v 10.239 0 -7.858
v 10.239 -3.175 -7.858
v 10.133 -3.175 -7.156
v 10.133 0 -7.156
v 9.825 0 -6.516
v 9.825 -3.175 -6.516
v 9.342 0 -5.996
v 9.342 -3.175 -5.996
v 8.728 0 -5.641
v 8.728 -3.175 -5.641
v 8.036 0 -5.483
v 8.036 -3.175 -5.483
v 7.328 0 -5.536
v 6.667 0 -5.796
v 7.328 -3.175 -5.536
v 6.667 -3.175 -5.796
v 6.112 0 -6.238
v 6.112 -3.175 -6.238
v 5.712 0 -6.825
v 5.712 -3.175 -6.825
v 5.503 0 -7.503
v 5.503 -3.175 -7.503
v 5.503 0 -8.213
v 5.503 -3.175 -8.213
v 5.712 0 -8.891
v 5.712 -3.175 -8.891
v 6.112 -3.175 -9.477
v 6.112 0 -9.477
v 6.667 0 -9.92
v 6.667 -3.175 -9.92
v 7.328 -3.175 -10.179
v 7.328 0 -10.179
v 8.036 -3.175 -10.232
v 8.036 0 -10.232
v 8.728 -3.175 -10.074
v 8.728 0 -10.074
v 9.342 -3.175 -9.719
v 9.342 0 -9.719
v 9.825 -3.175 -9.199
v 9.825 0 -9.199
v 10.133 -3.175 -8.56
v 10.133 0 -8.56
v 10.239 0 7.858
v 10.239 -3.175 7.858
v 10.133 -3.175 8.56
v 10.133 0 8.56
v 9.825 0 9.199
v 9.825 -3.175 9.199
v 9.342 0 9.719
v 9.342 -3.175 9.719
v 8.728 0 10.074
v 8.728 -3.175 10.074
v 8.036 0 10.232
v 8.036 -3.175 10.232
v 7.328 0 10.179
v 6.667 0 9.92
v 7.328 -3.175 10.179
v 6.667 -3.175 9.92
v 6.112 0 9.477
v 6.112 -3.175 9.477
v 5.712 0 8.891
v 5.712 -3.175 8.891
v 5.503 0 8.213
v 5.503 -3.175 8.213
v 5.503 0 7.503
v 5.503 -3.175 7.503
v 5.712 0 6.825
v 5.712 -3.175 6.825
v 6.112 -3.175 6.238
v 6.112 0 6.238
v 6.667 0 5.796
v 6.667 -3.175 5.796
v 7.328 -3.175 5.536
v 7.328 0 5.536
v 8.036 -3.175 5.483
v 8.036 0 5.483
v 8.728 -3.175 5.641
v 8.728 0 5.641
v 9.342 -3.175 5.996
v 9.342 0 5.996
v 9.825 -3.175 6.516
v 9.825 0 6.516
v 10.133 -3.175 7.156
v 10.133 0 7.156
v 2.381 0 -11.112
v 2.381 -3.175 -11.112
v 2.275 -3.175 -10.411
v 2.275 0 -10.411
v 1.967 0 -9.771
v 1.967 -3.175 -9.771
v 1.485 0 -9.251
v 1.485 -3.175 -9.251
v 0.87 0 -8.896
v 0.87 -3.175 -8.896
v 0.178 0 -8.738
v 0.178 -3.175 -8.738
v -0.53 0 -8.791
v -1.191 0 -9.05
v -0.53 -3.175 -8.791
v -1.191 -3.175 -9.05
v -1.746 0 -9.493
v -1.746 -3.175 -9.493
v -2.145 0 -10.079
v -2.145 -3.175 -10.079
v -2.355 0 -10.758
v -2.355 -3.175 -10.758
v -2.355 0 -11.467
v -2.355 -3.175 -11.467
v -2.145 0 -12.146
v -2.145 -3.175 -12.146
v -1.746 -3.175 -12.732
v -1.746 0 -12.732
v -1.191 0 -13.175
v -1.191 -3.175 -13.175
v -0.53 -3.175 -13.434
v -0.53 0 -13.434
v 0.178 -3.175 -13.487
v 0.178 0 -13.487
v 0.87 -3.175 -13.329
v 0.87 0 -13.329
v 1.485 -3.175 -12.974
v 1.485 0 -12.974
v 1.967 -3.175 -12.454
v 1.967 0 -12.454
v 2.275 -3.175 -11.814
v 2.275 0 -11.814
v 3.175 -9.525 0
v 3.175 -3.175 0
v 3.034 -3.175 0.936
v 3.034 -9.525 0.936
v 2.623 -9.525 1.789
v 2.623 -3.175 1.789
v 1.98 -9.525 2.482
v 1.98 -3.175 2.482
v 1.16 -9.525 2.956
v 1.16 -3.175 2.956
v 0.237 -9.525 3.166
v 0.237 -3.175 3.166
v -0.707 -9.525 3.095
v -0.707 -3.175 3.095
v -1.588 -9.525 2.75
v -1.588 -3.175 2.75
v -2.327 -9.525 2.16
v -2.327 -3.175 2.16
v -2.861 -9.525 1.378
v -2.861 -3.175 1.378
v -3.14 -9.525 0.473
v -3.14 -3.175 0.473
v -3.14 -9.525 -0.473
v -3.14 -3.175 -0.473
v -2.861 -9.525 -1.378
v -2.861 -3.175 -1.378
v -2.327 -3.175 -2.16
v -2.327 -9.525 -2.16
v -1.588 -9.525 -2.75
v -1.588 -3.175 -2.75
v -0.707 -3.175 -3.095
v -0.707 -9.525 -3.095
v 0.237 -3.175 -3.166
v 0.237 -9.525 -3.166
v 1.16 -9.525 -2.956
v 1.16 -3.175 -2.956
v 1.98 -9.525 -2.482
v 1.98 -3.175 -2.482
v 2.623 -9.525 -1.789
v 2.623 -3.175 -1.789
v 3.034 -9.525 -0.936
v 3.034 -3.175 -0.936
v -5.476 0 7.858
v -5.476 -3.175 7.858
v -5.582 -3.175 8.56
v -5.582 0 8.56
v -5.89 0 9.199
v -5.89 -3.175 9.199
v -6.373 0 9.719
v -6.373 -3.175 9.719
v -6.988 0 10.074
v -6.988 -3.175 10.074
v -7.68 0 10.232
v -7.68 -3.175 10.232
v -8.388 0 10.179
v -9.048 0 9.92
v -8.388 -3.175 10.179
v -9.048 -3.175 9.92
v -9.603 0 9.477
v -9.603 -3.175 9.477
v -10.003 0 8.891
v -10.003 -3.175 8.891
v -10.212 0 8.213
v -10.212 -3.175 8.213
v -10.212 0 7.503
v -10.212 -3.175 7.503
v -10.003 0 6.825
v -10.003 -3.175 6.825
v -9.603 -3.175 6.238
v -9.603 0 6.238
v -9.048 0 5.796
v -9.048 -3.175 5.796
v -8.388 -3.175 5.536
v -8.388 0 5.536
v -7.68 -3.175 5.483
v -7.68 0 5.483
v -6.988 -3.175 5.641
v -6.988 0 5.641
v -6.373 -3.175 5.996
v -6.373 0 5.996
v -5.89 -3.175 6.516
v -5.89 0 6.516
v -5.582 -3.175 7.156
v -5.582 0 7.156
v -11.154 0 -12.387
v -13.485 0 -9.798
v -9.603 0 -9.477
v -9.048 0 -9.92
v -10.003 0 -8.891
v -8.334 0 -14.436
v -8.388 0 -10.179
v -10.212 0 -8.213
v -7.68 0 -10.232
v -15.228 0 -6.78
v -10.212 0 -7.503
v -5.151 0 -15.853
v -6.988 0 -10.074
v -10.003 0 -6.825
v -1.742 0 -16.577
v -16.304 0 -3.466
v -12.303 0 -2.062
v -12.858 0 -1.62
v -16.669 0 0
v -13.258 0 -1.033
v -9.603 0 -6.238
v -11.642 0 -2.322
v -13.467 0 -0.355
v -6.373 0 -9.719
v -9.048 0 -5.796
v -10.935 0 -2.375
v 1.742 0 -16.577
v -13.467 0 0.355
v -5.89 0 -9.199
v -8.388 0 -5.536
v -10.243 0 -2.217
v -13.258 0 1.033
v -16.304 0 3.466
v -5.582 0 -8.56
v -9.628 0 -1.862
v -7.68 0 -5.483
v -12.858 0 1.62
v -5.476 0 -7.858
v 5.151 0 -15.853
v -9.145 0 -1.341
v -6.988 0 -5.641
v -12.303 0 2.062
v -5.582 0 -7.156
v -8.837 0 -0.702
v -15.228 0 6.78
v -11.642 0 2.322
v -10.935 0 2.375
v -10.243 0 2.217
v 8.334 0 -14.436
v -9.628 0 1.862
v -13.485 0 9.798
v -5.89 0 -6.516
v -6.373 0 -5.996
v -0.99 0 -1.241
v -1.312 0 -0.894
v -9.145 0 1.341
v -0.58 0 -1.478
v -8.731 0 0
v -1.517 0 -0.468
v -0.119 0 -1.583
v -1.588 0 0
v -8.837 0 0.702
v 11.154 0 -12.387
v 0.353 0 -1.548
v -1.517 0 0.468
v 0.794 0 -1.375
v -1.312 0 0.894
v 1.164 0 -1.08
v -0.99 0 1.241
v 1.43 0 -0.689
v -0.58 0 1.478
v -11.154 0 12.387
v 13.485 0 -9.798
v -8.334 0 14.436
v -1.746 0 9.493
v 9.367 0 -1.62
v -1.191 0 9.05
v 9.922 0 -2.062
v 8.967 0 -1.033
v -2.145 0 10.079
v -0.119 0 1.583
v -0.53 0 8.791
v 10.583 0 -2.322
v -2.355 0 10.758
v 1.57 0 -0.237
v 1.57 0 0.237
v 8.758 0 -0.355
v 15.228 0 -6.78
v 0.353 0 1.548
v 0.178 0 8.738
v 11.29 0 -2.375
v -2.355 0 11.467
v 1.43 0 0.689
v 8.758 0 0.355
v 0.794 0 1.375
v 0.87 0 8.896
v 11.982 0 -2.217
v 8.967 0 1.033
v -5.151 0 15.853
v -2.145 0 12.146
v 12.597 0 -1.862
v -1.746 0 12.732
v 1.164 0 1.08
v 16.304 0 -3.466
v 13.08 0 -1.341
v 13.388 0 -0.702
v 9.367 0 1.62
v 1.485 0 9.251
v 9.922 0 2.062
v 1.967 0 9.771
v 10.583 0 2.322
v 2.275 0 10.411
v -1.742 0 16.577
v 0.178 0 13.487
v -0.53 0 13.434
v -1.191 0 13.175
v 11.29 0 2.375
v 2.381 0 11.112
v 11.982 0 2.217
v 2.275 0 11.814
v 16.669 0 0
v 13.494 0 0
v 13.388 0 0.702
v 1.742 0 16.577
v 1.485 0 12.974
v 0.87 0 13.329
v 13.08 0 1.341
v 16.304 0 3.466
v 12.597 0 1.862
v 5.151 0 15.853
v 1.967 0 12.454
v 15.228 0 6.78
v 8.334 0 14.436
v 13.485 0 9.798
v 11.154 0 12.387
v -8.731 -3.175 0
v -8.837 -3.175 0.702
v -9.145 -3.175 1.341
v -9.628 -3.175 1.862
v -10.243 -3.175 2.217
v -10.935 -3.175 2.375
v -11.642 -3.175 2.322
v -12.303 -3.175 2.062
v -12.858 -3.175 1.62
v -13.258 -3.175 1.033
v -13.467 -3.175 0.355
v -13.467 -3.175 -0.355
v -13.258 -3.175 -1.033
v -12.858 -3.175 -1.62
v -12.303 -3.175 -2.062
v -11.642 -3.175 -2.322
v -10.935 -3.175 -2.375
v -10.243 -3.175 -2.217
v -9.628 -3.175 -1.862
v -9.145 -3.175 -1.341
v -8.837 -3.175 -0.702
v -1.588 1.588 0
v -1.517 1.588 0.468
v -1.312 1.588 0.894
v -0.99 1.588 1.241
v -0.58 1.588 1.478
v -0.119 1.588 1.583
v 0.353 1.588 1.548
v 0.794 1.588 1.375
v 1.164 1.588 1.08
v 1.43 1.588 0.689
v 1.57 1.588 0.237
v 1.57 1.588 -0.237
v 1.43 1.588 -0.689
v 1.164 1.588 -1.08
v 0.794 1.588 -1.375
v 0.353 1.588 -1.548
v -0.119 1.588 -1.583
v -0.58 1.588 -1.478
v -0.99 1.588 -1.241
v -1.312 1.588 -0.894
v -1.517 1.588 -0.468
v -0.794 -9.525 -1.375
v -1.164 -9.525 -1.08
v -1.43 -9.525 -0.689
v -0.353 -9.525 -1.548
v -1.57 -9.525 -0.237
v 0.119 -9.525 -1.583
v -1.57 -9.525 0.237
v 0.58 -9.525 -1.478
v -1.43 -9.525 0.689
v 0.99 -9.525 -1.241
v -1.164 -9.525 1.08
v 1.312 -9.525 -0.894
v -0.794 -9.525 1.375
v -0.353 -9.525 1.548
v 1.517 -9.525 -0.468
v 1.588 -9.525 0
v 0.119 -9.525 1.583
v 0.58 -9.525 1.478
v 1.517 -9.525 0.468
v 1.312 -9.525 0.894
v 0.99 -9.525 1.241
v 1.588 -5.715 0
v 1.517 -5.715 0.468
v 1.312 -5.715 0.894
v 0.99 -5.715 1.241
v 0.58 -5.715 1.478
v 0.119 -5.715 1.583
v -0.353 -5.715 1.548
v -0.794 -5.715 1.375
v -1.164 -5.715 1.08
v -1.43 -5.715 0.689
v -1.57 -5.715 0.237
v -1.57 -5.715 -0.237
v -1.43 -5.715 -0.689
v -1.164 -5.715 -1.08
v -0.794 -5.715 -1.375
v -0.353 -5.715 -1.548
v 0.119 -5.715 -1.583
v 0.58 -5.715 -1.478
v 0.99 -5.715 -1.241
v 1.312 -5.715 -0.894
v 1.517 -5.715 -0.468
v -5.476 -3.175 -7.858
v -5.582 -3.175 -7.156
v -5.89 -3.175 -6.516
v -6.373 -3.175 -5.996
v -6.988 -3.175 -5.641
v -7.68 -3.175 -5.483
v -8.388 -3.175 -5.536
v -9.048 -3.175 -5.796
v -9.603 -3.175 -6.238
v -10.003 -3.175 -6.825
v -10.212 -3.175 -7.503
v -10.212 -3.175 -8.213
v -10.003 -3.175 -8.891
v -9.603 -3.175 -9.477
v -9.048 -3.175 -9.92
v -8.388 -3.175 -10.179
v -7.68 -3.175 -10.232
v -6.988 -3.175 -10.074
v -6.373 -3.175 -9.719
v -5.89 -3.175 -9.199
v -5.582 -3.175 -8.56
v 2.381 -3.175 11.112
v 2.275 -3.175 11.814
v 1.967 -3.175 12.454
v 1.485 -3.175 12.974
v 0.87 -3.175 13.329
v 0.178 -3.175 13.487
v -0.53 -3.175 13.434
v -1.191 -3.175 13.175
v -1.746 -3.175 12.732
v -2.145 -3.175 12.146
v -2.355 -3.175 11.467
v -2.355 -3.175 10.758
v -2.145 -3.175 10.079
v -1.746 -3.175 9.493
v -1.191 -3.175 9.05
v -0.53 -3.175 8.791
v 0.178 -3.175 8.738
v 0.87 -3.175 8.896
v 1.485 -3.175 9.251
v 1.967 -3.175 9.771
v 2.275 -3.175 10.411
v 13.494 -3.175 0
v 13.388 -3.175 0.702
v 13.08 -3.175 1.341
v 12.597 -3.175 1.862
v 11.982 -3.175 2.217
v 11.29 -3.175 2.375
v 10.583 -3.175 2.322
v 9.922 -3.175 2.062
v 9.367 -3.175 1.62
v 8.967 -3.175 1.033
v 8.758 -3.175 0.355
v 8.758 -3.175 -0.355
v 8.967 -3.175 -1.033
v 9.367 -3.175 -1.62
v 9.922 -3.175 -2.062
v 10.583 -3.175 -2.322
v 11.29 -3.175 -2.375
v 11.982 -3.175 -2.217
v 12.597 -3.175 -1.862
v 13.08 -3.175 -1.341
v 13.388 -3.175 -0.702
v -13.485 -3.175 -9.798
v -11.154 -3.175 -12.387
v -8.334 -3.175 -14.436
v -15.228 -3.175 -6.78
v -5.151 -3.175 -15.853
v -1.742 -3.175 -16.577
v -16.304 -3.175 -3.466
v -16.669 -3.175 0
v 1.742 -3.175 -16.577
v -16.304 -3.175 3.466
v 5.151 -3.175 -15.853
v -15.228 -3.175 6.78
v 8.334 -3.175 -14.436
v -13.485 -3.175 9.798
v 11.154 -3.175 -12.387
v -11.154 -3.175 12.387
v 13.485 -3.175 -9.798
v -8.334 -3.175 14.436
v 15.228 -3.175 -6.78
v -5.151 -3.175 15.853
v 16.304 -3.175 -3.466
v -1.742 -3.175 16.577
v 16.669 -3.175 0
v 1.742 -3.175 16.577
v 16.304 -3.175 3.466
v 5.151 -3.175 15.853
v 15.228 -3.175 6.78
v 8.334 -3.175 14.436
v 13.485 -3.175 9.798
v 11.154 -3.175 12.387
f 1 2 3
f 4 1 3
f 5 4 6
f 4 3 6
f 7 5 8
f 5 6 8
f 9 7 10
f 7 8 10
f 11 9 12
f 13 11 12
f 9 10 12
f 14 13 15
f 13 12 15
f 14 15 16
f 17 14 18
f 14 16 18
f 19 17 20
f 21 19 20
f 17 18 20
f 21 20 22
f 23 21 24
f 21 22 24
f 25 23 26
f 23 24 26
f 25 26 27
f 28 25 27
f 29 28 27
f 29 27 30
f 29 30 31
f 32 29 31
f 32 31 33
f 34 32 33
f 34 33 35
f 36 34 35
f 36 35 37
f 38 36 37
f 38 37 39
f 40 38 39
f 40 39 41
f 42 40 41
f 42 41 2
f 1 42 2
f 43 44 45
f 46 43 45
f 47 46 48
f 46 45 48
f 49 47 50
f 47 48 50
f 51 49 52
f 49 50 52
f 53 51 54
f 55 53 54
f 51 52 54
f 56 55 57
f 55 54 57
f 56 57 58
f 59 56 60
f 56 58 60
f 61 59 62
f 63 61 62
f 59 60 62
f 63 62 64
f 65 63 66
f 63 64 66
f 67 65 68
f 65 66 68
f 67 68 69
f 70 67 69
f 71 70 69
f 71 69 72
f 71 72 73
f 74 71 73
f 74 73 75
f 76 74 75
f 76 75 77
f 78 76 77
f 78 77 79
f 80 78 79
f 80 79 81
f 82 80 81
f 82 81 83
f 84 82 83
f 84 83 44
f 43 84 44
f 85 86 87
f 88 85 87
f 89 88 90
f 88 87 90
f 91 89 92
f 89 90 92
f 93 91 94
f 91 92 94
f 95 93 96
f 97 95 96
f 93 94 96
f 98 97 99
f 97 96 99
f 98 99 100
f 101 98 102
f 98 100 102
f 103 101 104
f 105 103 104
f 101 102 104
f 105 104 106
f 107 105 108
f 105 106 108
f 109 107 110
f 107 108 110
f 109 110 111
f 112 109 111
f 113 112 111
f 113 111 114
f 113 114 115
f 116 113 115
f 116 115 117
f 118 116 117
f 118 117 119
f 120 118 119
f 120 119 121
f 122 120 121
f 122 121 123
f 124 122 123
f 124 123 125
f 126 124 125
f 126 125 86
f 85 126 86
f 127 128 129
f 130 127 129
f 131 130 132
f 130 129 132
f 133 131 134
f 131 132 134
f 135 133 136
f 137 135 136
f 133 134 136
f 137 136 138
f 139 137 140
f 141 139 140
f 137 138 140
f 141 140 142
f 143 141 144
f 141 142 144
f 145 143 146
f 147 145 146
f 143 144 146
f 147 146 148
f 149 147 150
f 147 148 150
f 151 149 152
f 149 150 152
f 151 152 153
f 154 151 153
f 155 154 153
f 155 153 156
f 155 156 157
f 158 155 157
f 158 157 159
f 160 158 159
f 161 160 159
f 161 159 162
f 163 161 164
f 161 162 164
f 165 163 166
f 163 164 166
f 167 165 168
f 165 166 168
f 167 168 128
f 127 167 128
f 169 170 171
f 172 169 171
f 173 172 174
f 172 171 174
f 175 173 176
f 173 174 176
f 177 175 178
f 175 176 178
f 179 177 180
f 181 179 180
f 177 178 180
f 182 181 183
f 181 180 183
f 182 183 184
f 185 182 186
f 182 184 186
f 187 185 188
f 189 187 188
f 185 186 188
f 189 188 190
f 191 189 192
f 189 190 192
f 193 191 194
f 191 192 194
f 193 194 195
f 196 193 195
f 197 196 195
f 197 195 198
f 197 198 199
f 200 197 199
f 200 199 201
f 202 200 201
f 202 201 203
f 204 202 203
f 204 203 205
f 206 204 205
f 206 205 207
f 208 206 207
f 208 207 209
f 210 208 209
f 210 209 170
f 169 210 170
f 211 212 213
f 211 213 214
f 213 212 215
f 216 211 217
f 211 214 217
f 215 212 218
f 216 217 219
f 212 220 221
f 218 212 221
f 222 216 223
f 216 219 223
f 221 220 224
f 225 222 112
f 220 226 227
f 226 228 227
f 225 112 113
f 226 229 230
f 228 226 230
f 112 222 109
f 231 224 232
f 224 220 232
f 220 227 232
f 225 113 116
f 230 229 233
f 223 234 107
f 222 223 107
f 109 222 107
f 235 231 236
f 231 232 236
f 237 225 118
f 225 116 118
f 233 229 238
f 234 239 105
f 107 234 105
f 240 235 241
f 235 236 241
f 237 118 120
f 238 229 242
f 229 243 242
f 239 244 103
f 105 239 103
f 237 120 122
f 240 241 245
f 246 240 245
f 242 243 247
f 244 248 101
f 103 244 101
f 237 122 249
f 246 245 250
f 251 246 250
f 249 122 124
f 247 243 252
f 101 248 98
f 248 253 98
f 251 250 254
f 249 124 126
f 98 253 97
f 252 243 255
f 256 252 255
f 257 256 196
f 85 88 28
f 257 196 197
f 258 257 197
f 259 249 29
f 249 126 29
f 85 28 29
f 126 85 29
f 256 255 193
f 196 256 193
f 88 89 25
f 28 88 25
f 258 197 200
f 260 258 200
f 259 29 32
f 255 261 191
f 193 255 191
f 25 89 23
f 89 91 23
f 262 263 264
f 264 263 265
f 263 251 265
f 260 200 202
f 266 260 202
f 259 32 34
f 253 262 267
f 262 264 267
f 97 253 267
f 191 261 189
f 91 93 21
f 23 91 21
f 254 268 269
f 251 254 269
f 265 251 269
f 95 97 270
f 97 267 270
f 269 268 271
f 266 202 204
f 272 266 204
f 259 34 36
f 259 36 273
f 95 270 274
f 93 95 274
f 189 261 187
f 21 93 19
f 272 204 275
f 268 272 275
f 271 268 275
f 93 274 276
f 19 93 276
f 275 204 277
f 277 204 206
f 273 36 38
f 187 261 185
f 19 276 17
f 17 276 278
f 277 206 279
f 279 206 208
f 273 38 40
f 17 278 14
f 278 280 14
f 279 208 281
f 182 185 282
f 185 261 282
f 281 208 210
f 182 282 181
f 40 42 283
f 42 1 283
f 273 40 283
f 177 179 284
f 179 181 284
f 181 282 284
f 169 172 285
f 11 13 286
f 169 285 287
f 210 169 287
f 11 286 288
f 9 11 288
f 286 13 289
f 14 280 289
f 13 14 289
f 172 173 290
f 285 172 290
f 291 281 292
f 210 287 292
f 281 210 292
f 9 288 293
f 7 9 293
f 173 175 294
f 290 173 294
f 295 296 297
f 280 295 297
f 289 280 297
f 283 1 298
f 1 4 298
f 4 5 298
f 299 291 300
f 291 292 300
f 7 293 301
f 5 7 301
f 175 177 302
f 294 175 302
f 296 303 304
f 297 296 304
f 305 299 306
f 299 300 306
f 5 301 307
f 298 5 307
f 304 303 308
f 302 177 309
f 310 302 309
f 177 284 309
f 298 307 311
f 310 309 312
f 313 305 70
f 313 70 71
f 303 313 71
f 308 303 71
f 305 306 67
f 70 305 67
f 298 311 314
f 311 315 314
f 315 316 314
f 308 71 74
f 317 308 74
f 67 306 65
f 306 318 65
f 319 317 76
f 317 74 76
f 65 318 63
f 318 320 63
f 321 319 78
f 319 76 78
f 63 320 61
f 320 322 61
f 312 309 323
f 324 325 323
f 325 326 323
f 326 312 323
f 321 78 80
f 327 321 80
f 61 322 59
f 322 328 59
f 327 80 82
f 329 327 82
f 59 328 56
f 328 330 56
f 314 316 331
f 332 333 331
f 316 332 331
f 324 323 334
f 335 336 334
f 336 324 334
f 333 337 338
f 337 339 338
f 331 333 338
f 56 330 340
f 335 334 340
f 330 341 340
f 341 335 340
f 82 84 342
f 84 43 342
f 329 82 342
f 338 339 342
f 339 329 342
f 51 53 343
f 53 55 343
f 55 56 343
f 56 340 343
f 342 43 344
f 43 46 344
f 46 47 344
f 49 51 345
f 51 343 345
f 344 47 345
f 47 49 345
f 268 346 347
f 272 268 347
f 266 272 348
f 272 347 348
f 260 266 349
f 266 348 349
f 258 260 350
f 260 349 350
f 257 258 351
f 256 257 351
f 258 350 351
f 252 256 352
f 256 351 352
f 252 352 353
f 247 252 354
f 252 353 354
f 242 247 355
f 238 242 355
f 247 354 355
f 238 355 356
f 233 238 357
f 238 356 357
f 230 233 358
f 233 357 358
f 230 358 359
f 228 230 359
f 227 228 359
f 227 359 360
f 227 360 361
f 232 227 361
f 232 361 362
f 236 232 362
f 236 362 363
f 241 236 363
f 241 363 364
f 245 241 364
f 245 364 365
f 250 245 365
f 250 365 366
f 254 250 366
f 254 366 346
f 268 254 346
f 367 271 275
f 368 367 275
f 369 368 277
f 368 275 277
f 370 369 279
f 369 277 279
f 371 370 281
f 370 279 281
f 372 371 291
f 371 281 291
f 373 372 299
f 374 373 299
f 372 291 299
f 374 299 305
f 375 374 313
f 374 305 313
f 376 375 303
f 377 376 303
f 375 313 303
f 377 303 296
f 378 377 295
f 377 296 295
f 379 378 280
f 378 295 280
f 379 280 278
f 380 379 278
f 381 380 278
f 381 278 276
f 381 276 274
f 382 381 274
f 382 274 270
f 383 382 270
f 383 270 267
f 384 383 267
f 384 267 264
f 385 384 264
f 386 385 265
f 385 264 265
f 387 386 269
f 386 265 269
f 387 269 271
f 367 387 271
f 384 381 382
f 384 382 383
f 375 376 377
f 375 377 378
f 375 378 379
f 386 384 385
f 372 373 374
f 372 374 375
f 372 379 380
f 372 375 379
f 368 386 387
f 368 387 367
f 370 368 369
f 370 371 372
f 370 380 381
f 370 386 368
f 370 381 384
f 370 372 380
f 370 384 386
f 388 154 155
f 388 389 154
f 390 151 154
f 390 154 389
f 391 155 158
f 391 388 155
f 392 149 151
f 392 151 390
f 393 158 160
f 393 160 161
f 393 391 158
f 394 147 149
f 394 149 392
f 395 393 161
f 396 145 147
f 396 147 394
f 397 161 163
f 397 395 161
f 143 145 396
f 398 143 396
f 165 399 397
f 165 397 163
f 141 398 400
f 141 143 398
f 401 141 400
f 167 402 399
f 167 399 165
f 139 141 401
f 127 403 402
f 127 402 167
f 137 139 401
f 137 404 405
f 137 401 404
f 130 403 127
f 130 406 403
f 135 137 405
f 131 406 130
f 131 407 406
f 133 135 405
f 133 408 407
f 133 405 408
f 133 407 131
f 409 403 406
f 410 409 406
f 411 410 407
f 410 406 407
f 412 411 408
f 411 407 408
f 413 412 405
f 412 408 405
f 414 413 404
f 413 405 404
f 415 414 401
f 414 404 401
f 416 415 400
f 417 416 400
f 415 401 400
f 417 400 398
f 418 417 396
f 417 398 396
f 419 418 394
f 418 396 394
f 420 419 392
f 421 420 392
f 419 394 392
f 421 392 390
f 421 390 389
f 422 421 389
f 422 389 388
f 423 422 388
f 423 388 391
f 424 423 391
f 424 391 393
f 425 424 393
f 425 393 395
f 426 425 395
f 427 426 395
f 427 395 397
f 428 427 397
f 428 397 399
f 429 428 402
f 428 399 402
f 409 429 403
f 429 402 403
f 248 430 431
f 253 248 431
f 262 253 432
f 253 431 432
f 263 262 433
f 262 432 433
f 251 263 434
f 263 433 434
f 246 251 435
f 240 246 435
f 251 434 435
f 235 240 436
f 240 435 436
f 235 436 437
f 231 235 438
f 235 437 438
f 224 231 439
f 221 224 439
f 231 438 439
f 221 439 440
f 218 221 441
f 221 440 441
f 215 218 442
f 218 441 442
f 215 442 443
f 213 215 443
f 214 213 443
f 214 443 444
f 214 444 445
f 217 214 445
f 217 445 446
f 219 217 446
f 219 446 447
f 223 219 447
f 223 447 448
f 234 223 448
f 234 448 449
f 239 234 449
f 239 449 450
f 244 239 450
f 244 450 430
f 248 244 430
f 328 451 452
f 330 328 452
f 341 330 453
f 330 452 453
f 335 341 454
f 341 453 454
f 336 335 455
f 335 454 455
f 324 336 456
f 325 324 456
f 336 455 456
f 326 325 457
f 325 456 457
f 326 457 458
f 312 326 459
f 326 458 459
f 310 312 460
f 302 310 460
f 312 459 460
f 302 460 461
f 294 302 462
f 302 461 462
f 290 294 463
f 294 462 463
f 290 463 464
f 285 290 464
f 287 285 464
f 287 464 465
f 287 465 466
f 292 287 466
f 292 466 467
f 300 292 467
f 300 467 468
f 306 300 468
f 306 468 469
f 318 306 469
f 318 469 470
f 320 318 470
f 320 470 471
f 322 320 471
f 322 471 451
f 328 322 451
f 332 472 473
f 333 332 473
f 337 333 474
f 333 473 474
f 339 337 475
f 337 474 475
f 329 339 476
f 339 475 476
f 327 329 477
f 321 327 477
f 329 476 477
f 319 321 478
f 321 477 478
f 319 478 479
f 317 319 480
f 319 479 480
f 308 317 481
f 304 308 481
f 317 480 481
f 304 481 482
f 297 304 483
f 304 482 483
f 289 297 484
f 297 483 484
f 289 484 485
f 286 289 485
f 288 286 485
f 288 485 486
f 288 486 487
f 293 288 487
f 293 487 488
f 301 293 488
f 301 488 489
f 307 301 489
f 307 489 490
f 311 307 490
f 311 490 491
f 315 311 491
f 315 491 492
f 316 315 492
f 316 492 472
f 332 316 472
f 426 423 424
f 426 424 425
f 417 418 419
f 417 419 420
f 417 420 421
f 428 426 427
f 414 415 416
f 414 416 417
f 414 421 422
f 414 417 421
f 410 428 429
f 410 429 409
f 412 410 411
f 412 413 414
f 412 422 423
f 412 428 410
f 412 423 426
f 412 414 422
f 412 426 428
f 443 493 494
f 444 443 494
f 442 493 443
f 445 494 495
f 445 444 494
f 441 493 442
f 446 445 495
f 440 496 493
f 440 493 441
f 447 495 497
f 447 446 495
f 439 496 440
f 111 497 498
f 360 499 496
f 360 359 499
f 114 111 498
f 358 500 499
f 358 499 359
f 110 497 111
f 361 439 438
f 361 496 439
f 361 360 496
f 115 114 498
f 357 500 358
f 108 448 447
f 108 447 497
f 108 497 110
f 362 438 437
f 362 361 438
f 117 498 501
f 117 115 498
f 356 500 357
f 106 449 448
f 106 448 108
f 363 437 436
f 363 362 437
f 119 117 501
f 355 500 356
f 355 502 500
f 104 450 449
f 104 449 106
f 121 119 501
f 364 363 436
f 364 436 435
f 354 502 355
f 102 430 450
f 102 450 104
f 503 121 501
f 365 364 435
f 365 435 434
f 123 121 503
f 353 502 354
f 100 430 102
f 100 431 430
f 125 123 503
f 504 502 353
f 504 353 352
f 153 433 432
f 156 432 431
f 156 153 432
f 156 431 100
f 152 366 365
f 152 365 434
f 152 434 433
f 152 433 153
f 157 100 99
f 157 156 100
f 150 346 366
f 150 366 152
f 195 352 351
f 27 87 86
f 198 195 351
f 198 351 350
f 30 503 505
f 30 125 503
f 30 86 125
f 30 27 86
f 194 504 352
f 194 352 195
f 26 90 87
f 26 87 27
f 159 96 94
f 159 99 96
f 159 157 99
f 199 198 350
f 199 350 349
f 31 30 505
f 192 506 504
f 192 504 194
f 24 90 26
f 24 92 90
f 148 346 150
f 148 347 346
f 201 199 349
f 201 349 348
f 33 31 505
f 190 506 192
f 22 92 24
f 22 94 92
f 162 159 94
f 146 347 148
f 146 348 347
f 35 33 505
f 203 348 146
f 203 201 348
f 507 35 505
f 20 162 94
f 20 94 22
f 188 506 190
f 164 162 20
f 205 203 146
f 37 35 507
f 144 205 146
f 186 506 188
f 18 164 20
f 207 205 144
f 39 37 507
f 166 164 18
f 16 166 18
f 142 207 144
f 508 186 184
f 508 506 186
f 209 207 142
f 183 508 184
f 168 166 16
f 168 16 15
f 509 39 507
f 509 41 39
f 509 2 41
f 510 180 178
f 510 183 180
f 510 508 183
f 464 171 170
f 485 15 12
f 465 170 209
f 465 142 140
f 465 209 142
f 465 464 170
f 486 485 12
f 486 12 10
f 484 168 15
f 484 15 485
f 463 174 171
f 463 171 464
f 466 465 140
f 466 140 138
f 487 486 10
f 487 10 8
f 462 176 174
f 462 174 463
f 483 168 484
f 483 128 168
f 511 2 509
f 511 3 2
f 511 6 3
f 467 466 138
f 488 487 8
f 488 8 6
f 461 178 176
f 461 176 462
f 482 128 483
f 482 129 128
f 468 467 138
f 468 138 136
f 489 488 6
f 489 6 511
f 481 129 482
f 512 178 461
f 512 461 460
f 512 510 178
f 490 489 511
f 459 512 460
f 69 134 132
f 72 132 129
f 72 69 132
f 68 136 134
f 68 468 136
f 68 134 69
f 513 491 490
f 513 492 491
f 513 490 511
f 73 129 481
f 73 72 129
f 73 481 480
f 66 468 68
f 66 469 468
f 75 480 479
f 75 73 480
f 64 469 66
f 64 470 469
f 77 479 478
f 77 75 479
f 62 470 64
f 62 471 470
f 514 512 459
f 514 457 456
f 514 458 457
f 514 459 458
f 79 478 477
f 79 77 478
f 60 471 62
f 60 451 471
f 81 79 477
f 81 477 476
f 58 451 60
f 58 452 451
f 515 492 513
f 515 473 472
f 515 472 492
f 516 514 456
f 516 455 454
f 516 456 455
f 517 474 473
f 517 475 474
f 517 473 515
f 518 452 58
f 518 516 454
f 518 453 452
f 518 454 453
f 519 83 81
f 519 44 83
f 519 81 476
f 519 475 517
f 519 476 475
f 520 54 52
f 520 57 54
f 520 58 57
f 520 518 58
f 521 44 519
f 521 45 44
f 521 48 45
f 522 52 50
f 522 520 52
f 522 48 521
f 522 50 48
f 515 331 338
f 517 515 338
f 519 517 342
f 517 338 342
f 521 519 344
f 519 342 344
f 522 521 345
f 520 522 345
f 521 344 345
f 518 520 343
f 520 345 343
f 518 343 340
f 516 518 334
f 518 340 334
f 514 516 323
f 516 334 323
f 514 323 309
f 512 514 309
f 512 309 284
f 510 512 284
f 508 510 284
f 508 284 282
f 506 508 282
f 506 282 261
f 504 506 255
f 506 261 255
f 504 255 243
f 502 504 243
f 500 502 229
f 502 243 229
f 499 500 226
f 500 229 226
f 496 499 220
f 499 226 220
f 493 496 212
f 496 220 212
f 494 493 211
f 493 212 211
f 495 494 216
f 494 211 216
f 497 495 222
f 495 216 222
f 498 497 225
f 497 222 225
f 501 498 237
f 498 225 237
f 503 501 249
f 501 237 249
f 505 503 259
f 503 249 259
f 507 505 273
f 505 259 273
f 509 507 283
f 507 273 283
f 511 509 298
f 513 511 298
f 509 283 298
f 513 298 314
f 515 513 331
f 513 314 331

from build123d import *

# Parameters (mm, degrees)
F0_R     = 16.66875
F1_DEPTH = 3.175
F2_R     = 3.175
F3_DEPTH = 6.35
F4_R     = 1.5875
F5_DEPTH = 3.81
F6_R     = 2.38125
F7_DEPTH = 25.4
F8_R     = 1.5875
F9_DEPTH = 1.5875


with BuildPart() as f1:
    # F0 (on Front) → F1 (new body)
    with BuildSketch(Plane.XZ):
        Circle(F0_R)
    extrude(amount=F1_DEPTH)

    # F2 (on face) → F3 (join)
    with BuildSketch(Plane.XZ.offset(3.175)):
        Circle(F2_R)
    extrude(amount=F3_DEPTH)

    # F4 (on face) → F5 (cut)
    with BuildSketch(Plane.XZ.offset(9.525)):
        Circle(F4_R)
    extrude(amount=-F5_DEPTH, mode=Mode.SUBTRACT)

    # F6 (on face) → F7 (cut)
    with BuildSketch(Plane.XZ.offset(3.175)):
        with Locations((11.1125, 0)):
            Circle(F6_R)
        with Locations((7.857724, 7.857724)):
            Circle(F6_R)
        with Locations((0, 11.1125)):
            Circle(F6_R)
        with Locations((-7.857724, 7.857724)):
            Circle(F6_R)
        with Locations((-11.1125, 0)):
            Circle(F6_R)
        with Locations((-7.857724, -7.857724)):
            Circle(F6_R)
        with Locations((0, -11.1125)):
            Circle(F6_R)
        with Locations((7.857724, -7.857724)):
            Circle(F6_R)
    extrude(amount=-F7_DEPTH, mode=Mode.SUBTRACT)

    # F8 (on face) → F9 (join)
    with BuildSketch(Plane(origin=(0, 0, 0), x_dir=(-1, 0, 0), z_dir=(0, 1, 0))):
        Circle(F8_R)
    extrude(amount=F9_DEPTH)


solid = f1.part
